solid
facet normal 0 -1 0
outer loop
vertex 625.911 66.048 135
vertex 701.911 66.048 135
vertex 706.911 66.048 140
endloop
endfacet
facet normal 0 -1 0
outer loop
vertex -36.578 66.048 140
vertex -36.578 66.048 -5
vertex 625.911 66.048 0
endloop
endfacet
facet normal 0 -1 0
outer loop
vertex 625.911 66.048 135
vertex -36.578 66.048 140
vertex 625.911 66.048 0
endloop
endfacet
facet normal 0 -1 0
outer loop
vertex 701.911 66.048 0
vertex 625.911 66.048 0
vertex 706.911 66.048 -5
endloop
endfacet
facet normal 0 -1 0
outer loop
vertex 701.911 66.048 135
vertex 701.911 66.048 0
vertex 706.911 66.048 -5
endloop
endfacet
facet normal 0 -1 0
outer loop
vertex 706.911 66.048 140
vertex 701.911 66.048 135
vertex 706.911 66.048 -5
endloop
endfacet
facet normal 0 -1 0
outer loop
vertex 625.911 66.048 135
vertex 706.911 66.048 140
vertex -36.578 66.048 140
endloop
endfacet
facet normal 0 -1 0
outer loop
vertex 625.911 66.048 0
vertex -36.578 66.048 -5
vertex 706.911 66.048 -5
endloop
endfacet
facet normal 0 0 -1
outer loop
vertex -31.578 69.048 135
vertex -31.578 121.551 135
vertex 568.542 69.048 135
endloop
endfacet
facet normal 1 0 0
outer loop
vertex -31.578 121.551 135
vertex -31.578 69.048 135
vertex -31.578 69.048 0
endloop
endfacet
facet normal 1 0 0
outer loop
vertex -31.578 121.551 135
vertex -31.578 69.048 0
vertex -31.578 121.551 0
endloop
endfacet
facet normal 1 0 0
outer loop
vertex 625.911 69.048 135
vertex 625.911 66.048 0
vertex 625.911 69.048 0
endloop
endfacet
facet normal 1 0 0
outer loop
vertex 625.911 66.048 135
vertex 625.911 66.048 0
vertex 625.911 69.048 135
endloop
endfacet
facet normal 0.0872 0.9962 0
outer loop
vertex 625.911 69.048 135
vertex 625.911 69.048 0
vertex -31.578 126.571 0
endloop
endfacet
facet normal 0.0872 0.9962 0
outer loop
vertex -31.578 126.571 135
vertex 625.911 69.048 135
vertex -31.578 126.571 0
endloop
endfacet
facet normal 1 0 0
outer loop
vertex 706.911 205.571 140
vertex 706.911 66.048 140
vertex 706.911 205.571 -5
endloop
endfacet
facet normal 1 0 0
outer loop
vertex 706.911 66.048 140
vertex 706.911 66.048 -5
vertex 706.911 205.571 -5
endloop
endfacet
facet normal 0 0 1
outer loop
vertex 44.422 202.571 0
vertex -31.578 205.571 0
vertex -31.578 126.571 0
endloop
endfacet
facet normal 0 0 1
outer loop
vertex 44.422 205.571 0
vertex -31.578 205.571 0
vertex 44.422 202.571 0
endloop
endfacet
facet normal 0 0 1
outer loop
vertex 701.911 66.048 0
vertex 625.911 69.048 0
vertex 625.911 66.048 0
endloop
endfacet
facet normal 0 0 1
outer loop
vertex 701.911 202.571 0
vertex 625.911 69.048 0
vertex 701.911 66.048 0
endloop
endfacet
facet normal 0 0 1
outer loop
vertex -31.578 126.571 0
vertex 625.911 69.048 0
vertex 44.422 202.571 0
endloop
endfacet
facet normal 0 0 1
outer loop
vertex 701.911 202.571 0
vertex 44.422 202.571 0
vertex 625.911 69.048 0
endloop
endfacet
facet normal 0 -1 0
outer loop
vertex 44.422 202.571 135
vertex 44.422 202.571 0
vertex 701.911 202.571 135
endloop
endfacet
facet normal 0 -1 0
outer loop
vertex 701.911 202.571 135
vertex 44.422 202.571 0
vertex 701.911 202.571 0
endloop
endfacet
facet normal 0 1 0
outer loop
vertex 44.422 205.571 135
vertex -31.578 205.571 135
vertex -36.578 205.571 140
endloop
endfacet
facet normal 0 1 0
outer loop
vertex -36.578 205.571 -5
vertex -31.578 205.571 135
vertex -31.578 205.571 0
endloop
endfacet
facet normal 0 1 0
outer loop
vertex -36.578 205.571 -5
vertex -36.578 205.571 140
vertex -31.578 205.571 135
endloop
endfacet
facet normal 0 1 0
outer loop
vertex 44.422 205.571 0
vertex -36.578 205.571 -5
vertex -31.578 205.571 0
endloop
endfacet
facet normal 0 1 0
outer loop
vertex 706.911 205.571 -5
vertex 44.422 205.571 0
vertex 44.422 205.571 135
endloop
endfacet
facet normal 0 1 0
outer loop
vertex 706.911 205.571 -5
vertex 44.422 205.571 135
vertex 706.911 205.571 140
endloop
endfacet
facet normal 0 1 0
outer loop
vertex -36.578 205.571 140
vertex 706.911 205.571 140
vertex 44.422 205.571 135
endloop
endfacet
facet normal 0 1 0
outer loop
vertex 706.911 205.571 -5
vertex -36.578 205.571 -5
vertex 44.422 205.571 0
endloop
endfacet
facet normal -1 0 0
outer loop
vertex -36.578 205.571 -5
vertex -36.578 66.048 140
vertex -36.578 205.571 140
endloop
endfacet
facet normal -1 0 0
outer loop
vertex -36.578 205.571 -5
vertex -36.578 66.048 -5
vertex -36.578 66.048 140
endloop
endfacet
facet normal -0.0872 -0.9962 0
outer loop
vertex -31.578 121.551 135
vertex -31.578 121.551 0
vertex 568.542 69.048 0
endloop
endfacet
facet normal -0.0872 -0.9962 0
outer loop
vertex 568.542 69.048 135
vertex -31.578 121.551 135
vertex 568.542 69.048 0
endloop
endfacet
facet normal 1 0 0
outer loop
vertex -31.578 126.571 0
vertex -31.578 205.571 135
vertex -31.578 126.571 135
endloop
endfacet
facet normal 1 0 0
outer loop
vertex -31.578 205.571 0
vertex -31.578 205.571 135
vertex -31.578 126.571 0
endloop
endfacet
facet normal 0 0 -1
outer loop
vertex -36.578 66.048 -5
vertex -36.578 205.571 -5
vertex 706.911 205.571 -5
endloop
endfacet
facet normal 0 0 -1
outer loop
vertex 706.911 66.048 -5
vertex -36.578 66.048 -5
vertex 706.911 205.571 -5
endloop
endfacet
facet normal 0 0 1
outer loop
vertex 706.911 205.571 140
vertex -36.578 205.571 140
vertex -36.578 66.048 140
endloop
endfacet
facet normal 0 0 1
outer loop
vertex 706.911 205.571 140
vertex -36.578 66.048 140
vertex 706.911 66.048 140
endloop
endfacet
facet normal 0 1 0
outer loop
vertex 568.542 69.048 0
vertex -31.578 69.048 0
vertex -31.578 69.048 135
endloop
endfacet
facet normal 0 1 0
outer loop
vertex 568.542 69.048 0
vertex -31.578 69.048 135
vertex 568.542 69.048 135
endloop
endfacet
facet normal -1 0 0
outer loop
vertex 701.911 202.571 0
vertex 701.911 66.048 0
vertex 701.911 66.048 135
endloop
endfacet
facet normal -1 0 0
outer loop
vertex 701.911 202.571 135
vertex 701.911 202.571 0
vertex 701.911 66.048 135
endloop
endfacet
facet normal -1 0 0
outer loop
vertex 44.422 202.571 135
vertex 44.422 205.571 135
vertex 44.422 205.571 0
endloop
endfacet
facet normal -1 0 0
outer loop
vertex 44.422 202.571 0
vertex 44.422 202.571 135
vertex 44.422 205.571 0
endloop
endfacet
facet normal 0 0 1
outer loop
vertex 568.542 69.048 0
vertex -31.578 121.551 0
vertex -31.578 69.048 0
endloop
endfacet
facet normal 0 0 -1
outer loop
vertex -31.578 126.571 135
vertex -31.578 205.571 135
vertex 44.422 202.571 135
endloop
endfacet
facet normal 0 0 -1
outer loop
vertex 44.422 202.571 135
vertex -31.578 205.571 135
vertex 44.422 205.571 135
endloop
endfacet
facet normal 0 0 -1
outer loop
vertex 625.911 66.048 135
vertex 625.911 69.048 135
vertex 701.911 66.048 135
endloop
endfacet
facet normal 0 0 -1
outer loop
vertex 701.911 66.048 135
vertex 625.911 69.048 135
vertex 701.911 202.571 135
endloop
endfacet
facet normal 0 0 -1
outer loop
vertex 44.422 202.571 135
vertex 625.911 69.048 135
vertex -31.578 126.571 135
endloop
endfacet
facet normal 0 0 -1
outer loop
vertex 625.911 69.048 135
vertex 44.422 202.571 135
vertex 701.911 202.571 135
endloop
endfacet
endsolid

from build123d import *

# Parameters (mm, degrees)
ESQUISSE1_W             = 743.48850074
ESQUISSE1_H             = 139.522790213
BOSS_EXTRU_1_DEPTH      = 135
ESQUISSE1_4_W           = 743.48850074
ESQUISSE1_4_H           = 139.522790213
BOSS_EXTRU_3_DEPTH      = 5
ESQUISSE2_W             = 743.48850074
ESQUISSE2_H             = 139.522790213
BOSS_EXTRU_4_DEPTH      = 5
ESQUISSE3_W             = 76
ESQUISSE3_H             = 135
ENL_V_MAT_EXTRU_1_DEPTH = 10
ESQUISSE4_W             = 76
ESQUISSE4_H             = 135
ENL_V_MAT_EXTRU_2_DEPTH = 10


with BuildPart() as part:
    # Esquisse1 → Boss.-Extru.1 (new body)
    with BuildSketch(Plane.XY):
        with Locations((335.166692979, 135.809178026)):
            Rectangle(ESQUISSE1_W, ESQUISSE1_H)
        Polygon((625.910943349, 69.047782919), (-31.577557391, 126.570573132), (-31.577557391, 202.570573132), (701.910943349, 202.570573132), (701.910943349, 69.047782919), align=None, mode=Mode.SUBTRACT)
        Polygon((-31.577557391, 121.551473945), (568.542377121, 69.047782919), (-31.577557391, 69.047782919), align=None, mode=Mode.SUBTRACT)
    extrude(amount=BOSS_EXTRU_1_DEPTH)

    # Esquisse1<4> → Boss.-Extru.3 (add)
    with BuildSketch(Plane.XY):
        with Locations((335.166692979, 135.809178026)):
            Rectangle(ESQUISSE1_4_W, ESQUISSE1_4_H)
    extrude(amount=-BOSS_EXTRU_3_DEPTH)

    # Esquisse2 → Boss.-Extru.4 (add)
    with BuildSketch(Plane.XY.offset(135)):
        with Locations((335.166692979, 135.809178026)):
            Rectangle(ESQUISSE2_W, ESQUISSE2_H)
    extrude(amount=BOSS_EXTRU_4_DEPTH)

    # Esquisse3 → Enlèv. mat.-Extru.1 (cut)
    with BuildSketch(Plane(origin=(0, 205.570573132, 0), x_dir=(1, 0, 0), z_dir=(0, 1, 0))):
        with Locations((6.422442609, -67.5)):
            Rectangle(ESQUISSE3_W, ESQUISSE3_H)
    extrude(amount=-ENL_V_MAT_EXTRU_1_DEPTH, mode=Mode.SUBTRACT)

    # Esquisse4 → Enlèv. mat.-Extru.2 (cut)
    with BuildSketch(Plane.XZ.offset(-66.047782919)):
        with Locations((663.910943349, 67.5)):
            Rectangle(ESQUISSE4_W, ESQUISSE4_H)
    extrude(amount=-ENL_V_MAT_EXTRU_2_DEPTH, mode=Mode.SUBTRACT)


solid = part.part
